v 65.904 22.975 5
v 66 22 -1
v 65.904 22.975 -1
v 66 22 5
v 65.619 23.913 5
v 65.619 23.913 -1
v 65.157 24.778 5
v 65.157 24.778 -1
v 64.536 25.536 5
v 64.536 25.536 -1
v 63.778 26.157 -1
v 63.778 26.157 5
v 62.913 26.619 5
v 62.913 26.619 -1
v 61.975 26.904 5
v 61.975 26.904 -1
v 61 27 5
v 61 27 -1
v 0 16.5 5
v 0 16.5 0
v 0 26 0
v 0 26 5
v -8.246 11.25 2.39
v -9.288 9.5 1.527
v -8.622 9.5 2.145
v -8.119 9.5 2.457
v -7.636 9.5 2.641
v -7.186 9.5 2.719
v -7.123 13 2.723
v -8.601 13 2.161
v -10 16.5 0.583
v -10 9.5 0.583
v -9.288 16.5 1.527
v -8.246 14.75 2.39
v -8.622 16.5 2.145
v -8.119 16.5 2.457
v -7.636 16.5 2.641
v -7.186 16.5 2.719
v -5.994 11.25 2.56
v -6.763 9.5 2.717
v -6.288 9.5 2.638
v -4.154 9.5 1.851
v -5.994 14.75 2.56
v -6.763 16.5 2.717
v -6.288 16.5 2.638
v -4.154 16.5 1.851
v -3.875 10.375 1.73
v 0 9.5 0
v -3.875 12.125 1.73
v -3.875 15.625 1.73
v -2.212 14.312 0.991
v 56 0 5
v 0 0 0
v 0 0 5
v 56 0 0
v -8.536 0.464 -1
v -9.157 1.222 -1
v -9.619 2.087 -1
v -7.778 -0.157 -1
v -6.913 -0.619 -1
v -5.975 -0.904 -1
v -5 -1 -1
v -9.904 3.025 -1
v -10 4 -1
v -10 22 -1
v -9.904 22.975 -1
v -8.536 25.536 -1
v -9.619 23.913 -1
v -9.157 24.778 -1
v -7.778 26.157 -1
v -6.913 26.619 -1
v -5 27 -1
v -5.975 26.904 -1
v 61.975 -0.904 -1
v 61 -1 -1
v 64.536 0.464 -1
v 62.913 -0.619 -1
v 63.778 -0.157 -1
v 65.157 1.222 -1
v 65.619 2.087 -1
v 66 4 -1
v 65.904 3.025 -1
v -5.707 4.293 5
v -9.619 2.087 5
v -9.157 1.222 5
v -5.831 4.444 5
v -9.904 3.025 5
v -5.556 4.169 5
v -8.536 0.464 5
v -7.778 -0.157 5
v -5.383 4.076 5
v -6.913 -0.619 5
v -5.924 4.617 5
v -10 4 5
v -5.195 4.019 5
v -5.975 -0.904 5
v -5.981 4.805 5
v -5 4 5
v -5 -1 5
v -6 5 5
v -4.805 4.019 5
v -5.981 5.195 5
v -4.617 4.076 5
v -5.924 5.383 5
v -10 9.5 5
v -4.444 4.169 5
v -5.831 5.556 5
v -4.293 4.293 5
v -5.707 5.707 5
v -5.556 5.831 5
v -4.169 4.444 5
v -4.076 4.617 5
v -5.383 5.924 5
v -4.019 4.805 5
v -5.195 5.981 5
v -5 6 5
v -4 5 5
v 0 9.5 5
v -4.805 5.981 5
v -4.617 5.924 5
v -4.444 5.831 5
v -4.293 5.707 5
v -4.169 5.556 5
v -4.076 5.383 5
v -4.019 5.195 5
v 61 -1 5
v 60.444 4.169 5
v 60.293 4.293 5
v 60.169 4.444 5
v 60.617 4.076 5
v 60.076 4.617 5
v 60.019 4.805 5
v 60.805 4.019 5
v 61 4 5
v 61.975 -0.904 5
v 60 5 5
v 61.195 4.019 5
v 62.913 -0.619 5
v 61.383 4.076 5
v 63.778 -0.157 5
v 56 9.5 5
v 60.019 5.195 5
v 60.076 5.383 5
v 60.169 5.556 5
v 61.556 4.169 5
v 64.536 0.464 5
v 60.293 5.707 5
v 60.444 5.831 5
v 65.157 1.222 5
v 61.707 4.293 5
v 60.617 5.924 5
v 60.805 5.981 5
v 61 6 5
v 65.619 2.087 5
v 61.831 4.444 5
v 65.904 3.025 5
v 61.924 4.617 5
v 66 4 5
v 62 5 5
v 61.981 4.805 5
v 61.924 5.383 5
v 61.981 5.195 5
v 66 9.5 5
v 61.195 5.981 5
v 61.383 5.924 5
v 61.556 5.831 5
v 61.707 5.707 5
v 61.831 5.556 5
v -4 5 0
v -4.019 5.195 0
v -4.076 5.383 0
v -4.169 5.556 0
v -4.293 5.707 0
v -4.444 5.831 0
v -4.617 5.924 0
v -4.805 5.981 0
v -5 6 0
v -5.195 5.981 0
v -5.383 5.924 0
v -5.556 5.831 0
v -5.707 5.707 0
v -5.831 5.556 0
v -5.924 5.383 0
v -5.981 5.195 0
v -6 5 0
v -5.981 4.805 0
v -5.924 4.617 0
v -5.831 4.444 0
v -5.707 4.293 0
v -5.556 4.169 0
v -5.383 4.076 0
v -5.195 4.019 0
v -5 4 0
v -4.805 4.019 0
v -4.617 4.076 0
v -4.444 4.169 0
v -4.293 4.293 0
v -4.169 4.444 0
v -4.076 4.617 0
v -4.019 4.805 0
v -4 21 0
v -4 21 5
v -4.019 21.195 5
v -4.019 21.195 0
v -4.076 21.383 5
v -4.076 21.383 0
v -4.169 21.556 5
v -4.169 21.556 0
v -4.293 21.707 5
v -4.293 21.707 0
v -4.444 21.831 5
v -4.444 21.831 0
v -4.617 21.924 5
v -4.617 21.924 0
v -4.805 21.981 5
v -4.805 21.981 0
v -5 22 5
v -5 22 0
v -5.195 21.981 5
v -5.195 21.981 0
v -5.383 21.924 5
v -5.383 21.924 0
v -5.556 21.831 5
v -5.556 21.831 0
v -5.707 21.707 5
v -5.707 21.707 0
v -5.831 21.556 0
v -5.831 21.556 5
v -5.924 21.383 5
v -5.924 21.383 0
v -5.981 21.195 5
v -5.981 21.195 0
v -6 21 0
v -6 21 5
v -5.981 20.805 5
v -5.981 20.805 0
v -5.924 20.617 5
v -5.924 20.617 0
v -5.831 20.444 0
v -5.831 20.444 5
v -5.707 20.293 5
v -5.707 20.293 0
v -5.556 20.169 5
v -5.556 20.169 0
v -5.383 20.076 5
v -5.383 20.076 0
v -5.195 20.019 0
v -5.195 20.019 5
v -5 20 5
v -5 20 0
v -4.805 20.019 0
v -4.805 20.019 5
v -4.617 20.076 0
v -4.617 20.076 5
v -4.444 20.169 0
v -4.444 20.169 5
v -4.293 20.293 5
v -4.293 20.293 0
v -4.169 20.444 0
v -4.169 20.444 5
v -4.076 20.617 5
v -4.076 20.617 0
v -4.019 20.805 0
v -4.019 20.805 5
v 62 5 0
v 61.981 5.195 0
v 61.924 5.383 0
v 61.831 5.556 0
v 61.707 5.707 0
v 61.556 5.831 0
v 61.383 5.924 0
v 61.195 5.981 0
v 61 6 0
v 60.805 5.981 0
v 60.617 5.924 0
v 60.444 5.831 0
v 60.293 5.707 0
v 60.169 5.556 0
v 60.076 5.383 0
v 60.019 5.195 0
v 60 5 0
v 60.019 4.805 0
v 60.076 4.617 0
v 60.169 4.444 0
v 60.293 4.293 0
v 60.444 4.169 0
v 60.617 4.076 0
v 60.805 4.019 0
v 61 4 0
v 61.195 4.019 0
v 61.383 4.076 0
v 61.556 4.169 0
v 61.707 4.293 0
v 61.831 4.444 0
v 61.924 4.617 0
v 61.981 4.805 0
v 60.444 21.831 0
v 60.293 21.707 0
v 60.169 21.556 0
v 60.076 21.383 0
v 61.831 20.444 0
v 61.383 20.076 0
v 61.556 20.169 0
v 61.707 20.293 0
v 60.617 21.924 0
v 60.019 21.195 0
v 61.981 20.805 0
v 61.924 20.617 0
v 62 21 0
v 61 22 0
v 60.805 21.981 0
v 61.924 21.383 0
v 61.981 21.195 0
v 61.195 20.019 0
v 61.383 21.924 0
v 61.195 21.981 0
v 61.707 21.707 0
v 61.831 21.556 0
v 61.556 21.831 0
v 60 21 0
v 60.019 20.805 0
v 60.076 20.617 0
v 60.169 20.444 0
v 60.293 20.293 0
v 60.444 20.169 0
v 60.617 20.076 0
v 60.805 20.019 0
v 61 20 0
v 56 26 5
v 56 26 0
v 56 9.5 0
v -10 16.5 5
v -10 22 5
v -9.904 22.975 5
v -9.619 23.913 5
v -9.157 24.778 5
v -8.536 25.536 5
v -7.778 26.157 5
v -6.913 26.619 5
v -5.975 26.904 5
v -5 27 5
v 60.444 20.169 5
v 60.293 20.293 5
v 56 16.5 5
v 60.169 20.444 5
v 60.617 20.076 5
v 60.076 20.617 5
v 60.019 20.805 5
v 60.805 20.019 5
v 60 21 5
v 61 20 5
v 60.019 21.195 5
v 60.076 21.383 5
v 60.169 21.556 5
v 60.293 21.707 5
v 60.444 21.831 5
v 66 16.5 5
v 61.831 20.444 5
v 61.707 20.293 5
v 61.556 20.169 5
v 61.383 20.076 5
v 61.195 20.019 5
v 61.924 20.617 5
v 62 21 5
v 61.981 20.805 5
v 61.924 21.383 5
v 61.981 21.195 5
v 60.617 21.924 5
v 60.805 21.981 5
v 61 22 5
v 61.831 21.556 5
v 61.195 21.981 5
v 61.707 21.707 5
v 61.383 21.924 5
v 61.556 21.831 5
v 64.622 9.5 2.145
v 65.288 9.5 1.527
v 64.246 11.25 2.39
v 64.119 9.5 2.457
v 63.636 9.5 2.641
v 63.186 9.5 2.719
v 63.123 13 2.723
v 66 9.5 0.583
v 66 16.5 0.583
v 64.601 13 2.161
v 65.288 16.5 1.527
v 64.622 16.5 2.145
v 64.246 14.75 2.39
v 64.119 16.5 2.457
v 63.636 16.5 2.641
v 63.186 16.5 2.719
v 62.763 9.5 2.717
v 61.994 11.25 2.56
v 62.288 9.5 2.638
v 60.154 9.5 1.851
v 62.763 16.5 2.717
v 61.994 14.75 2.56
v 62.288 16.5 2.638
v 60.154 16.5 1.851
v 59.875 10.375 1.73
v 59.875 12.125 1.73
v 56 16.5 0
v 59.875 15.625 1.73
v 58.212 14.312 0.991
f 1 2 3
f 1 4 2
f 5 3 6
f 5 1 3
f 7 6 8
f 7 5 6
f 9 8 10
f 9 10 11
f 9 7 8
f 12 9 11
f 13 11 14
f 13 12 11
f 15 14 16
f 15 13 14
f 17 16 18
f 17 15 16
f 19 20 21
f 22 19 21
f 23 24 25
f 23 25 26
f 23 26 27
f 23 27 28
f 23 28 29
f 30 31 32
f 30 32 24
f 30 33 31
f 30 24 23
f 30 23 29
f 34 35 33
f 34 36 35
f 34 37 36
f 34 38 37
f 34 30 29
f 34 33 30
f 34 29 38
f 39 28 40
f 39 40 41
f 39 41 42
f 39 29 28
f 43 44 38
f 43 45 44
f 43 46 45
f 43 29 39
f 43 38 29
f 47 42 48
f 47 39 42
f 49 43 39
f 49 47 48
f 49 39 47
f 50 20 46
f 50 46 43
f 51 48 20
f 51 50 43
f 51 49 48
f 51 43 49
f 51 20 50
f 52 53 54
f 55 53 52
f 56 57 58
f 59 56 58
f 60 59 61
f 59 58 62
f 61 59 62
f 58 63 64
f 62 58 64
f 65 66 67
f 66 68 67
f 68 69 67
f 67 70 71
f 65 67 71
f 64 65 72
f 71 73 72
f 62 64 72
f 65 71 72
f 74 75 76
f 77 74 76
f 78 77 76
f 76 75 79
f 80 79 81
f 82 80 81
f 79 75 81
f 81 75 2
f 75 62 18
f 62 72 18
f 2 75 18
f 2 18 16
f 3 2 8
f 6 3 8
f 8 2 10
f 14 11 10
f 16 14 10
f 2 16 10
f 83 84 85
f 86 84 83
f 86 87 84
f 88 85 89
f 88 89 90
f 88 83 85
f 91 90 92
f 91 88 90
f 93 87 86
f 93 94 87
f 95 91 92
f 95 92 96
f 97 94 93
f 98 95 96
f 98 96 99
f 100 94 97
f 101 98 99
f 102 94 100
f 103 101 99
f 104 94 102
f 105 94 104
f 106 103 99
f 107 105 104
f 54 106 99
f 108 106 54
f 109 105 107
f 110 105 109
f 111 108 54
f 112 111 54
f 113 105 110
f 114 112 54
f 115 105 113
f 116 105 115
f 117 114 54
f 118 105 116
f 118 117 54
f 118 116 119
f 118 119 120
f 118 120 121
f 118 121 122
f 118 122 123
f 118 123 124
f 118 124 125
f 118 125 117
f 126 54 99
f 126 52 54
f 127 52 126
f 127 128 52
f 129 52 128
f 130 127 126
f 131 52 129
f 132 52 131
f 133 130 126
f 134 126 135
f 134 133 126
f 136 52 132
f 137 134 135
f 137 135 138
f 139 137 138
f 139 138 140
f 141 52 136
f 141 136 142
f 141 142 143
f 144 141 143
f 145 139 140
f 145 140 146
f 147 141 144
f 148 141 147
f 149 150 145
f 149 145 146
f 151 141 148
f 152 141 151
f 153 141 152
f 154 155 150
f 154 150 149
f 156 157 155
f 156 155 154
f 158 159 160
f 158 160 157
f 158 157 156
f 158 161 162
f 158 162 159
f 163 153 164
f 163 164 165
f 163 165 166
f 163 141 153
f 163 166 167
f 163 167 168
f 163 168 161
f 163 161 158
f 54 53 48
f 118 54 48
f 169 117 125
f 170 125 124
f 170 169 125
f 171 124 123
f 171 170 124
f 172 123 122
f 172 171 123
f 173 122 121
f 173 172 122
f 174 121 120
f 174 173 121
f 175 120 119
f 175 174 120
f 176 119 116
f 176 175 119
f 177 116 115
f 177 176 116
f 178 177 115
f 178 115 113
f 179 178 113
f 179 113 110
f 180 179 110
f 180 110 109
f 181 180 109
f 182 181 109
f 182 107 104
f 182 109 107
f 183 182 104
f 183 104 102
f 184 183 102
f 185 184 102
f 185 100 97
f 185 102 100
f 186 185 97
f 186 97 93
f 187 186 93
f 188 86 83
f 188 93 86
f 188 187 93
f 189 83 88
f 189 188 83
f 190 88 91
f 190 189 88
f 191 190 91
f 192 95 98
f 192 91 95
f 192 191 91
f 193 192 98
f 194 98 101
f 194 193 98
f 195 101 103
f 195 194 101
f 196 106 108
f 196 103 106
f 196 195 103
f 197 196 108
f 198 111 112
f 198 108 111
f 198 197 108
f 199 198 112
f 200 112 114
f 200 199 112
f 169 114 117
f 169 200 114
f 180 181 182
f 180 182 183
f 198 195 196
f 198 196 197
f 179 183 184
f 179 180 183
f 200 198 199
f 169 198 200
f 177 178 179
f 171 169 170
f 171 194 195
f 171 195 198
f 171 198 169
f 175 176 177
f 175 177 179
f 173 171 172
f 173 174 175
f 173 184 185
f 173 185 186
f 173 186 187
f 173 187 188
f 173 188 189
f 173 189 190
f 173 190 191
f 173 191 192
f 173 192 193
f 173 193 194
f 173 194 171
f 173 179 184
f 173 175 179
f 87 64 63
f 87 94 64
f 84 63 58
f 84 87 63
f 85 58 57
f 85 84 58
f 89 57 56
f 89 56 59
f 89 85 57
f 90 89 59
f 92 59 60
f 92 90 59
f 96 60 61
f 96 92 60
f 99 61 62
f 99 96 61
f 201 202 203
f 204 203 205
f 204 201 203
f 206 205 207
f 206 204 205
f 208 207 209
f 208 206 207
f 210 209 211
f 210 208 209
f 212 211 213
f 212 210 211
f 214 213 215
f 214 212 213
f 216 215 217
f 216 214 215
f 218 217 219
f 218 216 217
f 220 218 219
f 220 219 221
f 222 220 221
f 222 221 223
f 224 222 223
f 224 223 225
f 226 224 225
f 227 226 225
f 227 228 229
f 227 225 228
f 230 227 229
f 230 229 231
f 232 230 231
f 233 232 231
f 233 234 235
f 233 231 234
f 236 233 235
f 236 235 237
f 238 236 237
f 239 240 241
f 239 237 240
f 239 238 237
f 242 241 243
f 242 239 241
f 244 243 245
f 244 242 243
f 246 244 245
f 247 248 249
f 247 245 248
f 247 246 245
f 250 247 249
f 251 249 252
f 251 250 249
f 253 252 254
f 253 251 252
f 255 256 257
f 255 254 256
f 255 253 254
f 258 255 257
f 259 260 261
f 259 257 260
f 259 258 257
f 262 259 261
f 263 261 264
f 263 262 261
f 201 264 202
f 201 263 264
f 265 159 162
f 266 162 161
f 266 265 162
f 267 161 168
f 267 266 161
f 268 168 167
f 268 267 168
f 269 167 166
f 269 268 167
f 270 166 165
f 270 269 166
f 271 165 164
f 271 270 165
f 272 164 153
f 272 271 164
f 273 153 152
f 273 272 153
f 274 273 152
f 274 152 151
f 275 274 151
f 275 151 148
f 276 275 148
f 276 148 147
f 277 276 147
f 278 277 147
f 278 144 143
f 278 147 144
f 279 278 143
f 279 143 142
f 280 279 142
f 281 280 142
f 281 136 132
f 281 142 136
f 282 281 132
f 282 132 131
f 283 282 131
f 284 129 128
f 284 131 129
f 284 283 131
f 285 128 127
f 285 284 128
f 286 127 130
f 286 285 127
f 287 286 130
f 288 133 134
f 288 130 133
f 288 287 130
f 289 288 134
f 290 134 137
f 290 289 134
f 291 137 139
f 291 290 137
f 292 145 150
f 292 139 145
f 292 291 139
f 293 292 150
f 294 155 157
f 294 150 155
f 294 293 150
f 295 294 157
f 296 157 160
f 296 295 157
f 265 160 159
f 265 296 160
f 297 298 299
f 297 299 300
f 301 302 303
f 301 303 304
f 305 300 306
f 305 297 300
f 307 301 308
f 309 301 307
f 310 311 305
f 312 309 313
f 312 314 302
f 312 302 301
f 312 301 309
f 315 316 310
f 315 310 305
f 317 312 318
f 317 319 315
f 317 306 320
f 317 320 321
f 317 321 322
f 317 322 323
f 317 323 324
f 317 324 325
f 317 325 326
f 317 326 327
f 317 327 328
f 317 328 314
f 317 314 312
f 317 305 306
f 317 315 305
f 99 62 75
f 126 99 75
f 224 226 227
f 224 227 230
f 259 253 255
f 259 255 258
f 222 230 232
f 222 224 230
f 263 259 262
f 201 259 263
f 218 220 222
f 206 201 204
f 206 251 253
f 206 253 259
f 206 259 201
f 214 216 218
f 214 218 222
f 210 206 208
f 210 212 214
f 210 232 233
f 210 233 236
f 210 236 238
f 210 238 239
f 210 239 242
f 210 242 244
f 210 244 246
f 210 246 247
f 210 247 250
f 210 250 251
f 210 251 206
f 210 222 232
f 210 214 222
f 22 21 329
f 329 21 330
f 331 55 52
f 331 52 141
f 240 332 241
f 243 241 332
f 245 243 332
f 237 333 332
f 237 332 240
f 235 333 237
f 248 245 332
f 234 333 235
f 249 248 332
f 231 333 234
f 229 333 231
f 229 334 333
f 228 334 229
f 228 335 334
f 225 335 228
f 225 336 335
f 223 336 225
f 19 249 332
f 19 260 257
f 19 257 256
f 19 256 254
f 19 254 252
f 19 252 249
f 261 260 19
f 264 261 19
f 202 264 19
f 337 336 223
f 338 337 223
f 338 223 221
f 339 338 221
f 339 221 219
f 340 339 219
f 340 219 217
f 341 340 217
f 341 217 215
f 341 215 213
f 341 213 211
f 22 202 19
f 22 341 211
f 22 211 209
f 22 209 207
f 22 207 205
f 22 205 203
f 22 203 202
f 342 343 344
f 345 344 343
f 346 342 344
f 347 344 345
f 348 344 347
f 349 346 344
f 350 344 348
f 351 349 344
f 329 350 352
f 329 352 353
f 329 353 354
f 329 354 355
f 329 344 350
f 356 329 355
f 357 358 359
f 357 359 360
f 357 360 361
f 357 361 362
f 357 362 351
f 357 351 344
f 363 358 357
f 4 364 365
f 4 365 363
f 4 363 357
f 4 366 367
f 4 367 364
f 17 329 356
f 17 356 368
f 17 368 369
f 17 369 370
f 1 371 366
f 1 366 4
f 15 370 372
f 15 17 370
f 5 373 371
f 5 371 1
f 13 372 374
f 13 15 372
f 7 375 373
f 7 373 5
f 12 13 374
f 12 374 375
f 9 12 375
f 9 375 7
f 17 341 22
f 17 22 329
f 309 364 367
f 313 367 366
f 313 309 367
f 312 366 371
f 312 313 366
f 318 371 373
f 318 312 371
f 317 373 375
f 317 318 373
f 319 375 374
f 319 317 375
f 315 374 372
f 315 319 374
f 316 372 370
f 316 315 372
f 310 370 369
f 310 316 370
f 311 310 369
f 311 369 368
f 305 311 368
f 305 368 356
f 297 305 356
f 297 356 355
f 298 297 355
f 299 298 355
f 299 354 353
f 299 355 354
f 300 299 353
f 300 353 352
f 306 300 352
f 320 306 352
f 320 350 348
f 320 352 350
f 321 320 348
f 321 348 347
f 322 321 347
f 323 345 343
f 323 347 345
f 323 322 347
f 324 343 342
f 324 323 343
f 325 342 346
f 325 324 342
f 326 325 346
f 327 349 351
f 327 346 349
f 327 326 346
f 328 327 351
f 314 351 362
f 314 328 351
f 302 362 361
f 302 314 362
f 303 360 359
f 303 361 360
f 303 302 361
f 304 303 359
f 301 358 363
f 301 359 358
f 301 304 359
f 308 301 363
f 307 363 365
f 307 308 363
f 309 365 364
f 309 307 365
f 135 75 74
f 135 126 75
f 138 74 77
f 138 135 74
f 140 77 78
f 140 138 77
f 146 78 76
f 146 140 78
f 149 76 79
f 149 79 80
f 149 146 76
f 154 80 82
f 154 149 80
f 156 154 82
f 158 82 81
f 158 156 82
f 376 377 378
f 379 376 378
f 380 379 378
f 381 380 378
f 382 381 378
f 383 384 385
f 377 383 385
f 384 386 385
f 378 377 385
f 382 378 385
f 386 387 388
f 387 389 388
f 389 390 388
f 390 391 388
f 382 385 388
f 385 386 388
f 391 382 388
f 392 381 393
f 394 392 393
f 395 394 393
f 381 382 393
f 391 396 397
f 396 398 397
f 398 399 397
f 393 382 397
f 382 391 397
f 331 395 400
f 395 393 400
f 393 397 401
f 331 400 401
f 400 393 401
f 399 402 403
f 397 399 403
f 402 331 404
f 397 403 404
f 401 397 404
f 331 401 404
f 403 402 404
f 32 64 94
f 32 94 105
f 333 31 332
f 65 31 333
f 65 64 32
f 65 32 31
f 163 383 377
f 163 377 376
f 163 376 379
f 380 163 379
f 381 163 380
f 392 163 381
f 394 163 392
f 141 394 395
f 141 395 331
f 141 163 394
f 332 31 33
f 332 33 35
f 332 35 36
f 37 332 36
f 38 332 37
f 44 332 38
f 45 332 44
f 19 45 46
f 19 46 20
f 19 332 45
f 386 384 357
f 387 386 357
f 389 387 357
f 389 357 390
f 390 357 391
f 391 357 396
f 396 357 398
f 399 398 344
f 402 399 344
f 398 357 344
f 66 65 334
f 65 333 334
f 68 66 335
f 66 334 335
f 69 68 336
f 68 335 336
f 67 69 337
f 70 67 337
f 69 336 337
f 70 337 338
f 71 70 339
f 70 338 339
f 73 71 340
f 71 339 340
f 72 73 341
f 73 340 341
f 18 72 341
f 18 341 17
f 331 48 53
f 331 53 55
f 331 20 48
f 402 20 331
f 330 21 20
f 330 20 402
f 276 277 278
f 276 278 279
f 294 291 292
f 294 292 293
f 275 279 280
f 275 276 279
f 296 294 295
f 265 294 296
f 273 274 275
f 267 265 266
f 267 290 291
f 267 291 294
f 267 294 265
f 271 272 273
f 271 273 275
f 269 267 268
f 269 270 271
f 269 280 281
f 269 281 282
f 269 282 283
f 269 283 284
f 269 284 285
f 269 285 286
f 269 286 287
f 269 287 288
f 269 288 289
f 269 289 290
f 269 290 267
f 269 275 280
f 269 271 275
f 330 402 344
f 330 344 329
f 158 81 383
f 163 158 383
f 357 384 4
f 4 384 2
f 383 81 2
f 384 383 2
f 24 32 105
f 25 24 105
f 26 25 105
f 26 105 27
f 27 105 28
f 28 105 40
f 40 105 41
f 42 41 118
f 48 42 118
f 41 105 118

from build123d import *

# Parameters (mm, degrees)
PAD_DEPTH      = 7
CYLINDER_R     = 1
CYLINDER_DEPTH = 10
ARRAY_X_COUNT  = 2
ARRAY_X_PITCH  = 66
ARRAY_Y_COUNT  = 2
ARRAY_Y_PITCH  = 16
BOX_W          = 56
BOX_H          = 26
BOX_DEPTH      = 5
BOX001_W       = 76
BOX001_H       = 28
BOX001_DEPTH   = 6
FILLET_R       = 5


with BuildPart() as wire_hole_body:
    # Sketch → Pad (new body)
    with BuildSketch(Plane.XZ):
        with BuildLine():
            Line((0, 5), (-10, 5))
            Line((-10, 5), (-10, 0.583155))
            add(Edge.make_bspline(
                [(-10, 0.583155), (-9.116008, 1.942432), (-7.251605, 3.386368), (-4.874426, 2.178075), (0, 0)],
                knots=[0, 0, 0, 0, 0.5, 1, 1, 1, 1], degree=3))
            Line((0, 0), (0, 5))
        make_face()
    extrude(amount=PAD_DEPTH)


with BuildPart() as part_mirroring:
    # Part__Mirroring: instance of wire hole body
    add(wire_hole_body.part.mirror(Plane(origin=(28, 0, 0), x_dir=(0, -1, 0), z_dir=(1, 0, 0))))


with BuildPart() as wire_hole_fusion:
    # Fusion001 base: copy of wire hole body
    add(wire_hole_body.part)

    # Fusion001: union Part__Mirroring
    add(part_mirroring.part)


with BuildPart() as wire_hole_fusion_1:
    # Fusion001 placement: moved
    add(wire_hole_fusion.part.moved(Location((0, 16.5, 0))))


with BuildPart() as screw_hole_array:
    # Cylinder → Cylinder (new body)
    with BuildSketch(Plane.XY):
        Circle(CYLINDER_R)
    extrude(amount=CYLINDER_DEPTH)

    # Array X: screw hole array ×2


with BuildPart() as screw_hole_array_1:
    add(screw_hole_array.part)
    with Locations(*[(i * ARRAY_X_PITCH, 0, 0) for i in range(1, ARRAY_X_COUNT)]):
        add(screw_hole_array.part)

    # Array Y: screw hole array ×2


with BuildPart() as screw_hole_array_2:
    add(screw_hole_array_1.part)
    with Locations(*[(0, i * ARRAY_Y_PITCH, 0) for i in range(1, ARRAY_Y_COUNT)]):
        add(screw_hole_array_1.part)


with BuildPart() as screw_hole_array_3:
    # Array placement: moved
    add(screw_hole_array_2.part.moved(Location((-5, 5, 0))))


with BuildPart() as extraction_fusion:
    # Box → Box (new body)
    with BuildSketch(Plane.XY):
        with Locations((28, 13)):
            Rectangle(BOX_W, BOX_H)
    extrude(amount=BOX_DEPTH)

    # Fusion: union wire hole fusion, screw hole array
    add(wire_hole_fusion_1.part)
    add(screw_hole_array_3.part)


with BuildPart() as box_cut:
    # Box001 → Box001 (new body)
    with BuildSketch(Plane(origin=(-10, -1, -1), x_dir=(1, 0, 0), z_dir=(0, 0, 1))):
        with Locations((38, 14)):
            Rectangle(BOX001_W, BOX001_H)
    extrude(amount=BOX001_DEPTH)

    # Fillet
    fillet_edges = [box_cut.edges().sort_by_distance(p)[0] for p in [
        (-10, -1, 2),
        (-10, 27, 2),
        (66, -1, 2),
        (66, 27, 2),
    ]]
    fillet(fillet_edges, radius=FILLET_R)

    # Cut: cut extraction fusion
    add(extraction_fusion.part, mode=Mode.SUBTRACT)


solid = box_cut.part
